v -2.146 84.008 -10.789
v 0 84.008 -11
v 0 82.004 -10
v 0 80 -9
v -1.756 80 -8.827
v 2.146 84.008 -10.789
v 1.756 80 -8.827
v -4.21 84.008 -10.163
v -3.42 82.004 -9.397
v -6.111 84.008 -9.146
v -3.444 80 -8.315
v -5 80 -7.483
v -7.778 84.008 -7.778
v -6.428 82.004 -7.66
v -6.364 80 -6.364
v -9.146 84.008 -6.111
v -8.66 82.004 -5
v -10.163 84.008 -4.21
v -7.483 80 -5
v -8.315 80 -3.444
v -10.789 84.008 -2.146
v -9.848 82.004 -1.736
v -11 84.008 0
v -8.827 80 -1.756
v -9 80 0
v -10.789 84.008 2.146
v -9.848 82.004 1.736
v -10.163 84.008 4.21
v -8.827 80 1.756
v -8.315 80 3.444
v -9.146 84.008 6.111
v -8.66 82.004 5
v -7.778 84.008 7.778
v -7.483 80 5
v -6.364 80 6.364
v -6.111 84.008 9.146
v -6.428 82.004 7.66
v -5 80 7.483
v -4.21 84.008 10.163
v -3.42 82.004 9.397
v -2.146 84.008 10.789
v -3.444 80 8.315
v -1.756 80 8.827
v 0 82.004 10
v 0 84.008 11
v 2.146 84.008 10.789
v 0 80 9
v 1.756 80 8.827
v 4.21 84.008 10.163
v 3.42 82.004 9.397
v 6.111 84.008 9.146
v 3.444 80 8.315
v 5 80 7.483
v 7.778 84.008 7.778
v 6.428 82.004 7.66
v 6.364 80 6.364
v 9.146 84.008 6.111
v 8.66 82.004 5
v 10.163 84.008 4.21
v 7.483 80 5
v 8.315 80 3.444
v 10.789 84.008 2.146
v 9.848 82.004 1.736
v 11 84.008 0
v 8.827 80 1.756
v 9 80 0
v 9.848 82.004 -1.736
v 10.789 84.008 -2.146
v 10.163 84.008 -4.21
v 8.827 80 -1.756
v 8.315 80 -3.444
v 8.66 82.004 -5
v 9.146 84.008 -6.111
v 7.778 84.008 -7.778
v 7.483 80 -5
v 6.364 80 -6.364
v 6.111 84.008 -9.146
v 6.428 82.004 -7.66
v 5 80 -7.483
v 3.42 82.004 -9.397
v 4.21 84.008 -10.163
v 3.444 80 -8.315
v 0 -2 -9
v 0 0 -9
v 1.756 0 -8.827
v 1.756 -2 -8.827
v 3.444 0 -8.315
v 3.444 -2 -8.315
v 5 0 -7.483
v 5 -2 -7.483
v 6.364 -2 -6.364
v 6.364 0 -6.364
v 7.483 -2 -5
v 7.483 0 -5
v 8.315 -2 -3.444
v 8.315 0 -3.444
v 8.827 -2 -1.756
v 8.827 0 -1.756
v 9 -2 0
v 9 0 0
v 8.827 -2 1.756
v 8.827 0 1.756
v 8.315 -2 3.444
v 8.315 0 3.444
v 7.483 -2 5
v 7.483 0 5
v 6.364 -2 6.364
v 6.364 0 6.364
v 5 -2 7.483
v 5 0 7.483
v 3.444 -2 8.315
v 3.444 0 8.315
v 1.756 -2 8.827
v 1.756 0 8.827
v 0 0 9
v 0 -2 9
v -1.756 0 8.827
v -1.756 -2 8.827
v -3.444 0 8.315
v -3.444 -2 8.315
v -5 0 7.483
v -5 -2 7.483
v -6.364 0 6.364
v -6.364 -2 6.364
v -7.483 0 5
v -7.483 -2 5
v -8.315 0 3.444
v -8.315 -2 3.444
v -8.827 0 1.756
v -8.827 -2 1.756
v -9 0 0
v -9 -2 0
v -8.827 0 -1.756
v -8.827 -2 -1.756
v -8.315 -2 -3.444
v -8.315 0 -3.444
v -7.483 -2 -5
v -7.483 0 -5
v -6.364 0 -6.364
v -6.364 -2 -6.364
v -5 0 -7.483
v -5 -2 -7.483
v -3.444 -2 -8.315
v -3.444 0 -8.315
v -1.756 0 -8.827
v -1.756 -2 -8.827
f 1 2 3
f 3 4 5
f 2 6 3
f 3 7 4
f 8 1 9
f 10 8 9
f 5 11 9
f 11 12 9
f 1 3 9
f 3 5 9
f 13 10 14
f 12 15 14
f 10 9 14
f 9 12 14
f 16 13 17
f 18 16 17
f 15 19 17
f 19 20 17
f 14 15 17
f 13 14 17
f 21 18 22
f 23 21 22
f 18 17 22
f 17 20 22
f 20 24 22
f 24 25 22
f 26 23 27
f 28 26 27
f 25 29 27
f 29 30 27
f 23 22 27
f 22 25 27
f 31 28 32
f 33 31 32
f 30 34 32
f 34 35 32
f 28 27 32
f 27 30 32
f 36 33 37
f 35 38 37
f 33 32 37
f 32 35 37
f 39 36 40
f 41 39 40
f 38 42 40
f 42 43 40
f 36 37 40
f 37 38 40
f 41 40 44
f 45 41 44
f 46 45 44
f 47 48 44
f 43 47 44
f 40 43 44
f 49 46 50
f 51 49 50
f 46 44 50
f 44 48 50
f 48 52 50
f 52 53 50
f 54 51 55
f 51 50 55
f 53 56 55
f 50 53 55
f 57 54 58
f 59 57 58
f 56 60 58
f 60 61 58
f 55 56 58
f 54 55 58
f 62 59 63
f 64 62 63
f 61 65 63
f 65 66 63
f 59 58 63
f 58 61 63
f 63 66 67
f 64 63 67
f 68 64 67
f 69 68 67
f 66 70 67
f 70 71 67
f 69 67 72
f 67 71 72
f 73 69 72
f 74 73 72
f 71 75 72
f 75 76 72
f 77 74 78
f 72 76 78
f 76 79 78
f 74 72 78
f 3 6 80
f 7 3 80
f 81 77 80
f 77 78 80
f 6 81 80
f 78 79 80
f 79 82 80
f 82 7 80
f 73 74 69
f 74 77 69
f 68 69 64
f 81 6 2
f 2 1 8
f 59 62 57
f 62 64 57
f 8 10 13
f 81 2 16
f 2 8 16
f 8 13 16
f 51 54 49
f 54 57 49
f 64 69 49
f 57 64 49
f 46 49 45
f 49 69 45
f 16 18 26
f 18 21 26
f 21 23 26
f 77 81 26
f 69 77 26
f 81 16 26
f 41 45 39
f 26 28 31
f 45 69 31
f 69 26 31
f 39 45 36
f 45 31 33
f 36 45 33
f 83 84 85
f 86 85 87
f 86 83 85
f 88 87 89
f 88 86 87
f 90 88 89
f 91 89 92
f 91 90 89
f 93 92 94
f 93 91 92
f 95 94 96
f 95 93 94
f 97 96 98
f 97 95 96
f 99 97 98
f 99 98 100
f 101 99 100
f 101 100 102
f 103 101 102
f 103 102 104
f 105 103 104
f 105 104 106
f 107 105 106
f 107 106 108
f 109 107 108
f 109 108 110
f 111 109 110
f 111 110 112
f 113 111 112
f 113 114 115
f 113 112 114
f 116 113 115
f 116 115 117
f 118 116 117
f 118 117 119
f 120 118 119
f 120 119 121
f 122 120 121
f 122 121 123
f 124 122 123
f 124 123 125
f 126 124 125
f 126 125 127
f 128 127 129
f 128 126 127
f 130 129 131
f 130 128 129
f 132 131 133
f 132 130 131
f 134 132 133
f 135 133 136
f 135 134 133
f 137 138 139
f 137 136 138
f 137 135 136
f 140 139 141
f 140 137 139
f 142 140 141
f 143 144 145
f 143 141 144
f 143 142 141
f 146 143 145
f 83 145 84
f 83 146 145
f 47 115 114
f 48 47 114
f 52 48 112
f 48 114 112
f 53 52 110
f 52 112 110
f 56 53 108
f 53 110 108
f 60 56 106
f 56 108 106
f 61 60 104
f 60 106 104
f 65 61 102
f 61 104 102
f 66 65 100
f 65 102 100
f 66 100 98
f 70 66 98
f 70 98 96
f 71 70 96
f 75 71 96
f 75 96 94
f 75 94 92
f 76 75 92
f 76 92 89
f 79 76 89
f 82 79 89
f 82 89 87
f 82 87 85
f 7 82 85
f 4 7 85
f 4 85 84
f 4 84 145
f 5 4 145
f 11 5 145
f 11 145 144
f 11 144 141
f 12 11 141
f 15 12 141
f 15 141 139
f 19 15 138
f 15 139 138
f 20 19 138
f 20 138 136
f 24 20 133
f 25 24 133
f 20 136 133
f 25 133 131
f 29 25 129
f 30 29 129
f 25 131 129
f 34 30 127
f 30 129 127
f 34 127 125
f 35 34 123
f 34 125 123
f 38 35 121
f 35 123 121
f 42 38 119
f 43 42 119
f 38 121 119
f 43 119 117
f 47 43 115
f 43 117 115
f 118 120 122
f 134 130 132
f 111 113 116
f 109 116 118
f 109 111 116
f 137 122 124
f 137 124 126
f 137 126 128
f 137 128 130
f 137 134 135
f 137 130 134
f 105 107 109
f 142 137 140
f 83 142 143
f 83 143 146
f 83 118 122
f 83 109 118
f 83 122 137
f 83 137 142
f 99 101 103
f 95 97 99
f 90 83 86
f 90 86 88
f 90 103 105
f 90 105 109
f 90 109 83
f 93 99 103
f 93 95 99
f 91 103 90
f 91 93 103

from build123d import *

# Parameters (mm, degrees)
SKETCH1_R           = 9
BOSS_EXTRUDE1_DEPTH = 80
BOSS_EXTRUDE2_START = 2
SKETCH2_R           = 9
BOSS_EXTRUDE2_DEPTH = 2


with BuildPart() as part:
    # Sketch1 → Boss-Extrude1 (new body)
    with BuildSketch(Plane(origin=(0, 0, 0), x_dir=(1, 0, 0), z_dir=(0, 1, 0))):
        with Locations(Location((0, 0, 0), (0, 0, 270))):
            Circle(SKETCH1_R)
    extrude(amount=BOSS_EXTRUDE1_DEPTH)

    # Sketch2 → Boss-Extrude2 (add)
    with BuildSketch(Plane.XZ.offset(BOSS_EXTRUDE2_START)):
        with Locations(Location((0, 0, 0), (0, 0, 270))):
            Circle(SKETCH2_R)
    extrude(amount=-BOSS_EXTRUDE2_DEPTH)

    # Sketch4 → Revolve1 (revolve)
    with BuildSketch(Plane(origin=(0, 0, 0), x_dir=(0, 0, -1), z_dir=(1, 0, 0))):
        Polygon((9, 80), (0, 80), (0, 84.007892879), (11, 84.007892879), align=None)
    revolve(axis=Axis((0, 75.015231433, 0), (0, 1, 0)))


solid = part.part
